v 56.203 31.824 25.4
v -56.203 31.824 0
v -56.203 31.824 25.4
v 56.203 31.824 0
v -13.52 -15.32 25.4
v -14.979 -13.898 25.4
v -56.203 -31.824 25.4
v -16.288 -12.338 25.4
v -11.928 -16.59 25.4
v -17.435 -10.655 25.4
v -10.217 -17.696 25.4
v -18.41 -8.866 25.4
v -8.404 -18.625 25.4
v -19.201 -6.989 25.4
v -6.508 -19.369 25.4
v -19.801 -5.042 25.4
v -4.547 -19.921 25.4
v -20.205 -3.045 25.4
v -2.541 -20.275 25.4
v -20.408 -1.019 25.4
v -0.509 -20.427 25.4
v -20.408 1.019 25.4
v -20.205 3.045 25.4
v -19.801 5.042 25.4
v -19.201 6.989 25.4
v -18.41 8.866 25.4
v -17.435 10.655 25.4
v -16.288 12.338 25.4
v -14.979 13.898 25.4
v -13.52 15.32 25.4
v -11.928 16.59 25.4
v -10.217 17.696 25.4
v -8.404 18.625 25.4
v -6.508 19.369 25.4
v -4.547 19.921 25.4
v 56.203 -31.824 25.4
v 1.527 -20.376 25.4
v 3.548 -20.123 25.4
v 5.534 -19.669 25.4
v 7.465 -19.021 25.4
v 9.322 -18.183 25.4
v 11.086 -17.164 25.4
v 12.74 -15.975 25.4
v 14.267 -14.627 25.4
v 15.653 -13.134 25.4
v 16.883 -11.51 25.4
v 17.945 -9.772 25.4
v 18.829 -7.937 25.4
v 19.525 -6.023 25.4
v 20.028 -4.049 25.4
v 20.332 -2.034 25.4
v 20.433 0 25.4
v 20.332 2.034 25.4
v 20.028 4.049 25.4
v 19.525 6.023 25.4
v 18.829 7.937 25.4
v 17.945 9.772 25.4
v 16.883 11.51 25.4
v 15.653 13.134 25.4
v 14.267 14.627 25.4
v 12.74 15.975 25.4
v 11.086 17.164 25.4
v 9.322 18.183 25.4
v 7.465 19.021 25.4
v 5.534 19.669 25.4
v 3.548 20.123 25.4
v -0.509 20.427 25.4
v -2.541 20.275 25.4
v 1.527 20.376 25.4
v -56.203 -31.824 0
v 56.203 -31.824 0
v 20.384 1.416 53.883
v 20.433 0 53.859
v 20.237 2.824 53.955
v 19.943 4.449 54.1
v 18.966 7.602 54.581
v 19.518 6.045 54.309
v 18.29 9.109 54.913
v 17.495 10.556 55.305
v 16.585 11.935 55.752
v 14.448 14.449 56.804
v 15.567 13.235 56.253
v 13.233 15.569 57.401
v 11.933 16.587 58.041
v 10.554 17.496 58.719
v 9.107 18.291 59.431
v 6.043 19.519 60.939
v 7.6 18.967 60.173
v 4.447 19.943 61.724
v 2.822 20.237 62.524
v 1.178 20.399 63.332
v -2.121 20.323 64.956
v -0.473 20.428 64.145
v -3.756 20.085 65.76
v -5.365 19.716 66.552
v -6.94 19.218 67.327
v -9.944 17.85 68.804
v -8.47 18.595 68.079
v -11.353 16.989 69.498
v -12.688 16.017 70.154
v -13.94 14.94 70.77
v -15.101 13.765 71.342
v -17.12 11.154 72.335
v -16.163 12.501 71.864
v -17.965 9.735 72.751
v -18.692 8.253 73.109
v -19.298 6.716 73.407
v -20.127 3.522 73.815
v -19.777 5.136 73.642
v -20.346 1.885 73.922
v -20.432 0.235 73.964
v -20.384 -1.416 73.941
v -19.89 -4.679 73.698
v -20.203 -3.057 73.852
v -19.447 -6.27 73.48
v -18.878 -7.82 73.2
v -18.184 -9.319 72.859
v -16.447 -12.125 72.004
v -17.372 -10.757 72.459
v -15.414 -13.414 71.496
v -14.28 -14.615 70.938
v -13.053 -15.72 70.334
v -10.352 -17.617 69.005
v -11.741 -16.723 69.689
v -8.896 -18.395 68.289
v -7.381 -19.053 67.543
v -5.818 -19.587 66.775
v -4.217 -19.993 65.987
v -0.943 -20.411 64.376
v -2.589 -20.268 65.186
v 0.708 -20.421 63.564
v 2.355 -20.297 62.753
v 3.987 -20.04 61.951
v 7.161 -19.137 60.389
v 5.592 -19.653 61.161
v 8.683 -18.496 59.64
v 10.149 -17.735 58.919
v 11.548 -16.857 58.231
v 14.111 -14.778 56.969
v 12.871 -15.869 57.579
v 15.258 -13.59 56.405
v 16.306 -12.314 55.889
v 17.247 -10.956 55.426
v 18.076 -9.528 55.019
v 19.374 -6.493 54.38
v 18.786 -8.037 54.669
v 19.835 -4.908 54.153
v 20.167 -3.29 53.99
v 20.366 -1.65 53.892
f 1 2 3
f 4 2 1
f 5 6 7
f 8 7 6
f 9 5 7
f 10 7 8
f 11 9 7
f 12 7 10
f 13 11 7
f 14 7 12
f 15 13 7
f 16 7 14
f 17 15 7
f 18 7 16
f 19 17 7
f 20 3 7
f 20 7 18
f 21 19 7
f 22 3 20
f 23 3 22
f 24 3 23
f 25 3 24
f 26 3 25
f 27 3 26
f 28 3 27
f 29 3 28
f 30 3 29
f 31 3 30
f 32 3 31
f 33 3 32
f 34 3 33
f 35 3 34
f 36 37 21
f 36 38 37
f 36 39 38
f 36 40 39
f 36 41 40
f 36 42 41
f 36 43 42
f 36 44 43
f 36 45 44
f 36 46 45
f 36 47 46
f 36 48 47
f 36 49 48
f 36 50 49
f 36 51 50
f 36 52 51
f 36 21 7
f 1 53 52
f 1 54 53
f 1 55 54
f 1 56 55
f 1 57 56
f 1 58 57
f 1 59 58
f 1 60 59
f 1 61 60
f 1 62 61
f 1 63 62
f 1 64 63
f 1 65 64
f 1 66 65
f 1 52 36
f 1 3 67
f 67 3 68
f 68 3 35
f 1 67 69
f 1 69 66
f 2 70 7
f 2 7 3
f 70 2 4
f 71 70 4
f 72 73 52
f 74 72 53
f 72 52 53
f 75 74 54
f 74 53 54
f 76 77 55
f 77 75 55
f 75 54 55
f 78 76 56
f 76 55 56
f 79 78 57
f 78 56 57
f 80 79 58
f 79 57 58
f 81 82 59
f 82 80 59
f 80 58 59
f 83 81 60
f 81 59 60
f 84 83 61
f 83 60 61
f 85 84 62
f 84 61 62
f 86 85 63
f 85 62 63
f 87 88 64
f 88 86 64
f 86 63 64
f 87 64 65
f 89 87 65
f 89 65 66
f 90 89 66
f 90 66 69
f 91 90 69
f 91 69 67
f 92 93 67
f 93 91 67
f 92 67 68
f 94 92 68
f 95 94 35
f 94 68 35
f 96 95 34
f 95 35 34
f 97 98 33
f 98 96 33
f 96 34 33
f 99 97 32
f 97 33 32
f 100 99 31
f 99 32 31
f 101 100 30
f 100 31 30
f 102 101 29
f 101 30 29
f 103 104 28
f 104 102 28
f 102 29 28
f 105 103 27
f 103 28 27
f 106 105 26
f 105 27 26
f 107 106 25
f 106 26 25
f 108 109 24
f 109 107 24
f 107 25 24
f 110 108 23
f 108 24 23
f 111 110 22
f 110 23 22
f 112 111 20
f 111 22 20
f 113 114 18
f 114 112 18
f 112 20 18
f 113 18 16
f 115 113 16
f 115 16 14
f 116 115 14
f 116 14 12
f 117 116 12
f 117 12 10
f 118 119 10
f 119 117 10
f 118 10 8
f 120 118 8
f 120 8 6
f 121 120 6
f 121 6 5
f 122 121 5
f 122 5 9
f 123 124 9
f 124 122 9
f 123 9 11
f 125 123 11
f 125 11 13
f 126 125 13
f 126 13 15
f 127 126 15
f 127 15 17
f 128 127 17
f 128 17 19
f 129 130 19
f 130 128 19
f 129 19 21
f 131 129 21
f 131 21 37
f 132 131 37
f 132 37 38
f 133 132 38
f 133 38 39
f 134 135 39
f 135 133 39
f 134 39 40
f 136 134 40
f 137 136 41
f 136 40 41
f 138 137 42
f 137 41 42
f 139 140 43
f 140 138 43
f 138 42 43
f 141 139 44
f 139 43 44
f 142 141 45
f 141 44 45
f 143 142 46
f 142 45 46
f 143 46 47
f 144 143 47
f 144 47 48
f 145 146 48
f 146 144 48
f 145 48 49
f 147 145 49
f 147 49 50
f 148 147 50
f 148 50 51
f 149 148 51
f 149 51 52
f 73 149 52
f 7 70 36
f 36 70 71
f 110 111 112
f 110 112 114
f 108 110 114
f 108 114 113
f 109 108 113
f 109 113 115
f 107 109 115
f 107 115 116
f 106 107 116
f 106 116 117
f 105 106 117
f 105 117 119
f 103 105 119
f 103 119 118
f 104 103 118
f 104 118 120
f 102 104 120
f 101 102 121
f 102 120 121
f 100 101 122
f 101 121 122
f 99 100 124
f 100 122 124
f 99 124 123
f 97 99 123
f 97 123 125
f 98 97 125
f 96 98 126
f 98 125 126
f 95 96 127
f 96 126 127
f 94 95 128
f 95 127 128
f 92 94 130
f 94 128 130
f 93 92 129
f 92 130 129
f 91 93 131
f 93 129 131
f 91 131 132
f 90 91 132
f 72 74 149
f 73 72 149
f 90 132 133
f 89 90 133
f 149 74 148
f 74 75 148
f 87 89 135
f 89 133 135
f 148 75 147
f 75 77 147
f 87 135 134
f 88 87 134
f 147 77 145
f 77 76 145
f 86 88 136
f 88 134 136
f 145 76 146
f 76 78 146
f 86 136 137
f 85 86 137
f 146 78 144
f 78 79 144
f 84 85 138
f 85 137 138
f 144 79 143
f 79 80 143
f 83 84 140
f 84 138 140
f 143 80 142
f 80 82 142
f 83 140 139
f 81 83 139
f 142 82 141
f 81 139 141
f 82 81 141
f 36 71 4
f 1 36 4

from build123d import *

# Parameters (mm, degrees)
F0_W     = 112.405978
F0_H     = 63.648052
F1_DEPTH = 25.4
F2_R     = 20.433121
F3_DEPTH = 50.8
F5_DEPTH = 25.4


with BuildPart() as f1:
    # F0 (on Top) → F1 (new body)
    with BuildSketch(Plane.XY):
        Rectangle(F0_W, F0_H)
    extrude(amount=F1_DEPTH)

    # F2 (on face) → F3 (join)
    with BuildSketch(Plane.XY.offset(25.4)):
        Circle(F2_R)
    extrude(amount=F3_DEPTH)

    # F4 (on Front) → F5 (cut, symmetric)
    with BuildSketch(Plane.XZ):
        Polygon((42.320769, 80.948107), (-34.6261, 80.948107), (42.320769, 43.09025), align=None)
    extrude(amount=F5_DEPTH, both=True, mode=Mode.SUBTRACT)


solid = f1.part
